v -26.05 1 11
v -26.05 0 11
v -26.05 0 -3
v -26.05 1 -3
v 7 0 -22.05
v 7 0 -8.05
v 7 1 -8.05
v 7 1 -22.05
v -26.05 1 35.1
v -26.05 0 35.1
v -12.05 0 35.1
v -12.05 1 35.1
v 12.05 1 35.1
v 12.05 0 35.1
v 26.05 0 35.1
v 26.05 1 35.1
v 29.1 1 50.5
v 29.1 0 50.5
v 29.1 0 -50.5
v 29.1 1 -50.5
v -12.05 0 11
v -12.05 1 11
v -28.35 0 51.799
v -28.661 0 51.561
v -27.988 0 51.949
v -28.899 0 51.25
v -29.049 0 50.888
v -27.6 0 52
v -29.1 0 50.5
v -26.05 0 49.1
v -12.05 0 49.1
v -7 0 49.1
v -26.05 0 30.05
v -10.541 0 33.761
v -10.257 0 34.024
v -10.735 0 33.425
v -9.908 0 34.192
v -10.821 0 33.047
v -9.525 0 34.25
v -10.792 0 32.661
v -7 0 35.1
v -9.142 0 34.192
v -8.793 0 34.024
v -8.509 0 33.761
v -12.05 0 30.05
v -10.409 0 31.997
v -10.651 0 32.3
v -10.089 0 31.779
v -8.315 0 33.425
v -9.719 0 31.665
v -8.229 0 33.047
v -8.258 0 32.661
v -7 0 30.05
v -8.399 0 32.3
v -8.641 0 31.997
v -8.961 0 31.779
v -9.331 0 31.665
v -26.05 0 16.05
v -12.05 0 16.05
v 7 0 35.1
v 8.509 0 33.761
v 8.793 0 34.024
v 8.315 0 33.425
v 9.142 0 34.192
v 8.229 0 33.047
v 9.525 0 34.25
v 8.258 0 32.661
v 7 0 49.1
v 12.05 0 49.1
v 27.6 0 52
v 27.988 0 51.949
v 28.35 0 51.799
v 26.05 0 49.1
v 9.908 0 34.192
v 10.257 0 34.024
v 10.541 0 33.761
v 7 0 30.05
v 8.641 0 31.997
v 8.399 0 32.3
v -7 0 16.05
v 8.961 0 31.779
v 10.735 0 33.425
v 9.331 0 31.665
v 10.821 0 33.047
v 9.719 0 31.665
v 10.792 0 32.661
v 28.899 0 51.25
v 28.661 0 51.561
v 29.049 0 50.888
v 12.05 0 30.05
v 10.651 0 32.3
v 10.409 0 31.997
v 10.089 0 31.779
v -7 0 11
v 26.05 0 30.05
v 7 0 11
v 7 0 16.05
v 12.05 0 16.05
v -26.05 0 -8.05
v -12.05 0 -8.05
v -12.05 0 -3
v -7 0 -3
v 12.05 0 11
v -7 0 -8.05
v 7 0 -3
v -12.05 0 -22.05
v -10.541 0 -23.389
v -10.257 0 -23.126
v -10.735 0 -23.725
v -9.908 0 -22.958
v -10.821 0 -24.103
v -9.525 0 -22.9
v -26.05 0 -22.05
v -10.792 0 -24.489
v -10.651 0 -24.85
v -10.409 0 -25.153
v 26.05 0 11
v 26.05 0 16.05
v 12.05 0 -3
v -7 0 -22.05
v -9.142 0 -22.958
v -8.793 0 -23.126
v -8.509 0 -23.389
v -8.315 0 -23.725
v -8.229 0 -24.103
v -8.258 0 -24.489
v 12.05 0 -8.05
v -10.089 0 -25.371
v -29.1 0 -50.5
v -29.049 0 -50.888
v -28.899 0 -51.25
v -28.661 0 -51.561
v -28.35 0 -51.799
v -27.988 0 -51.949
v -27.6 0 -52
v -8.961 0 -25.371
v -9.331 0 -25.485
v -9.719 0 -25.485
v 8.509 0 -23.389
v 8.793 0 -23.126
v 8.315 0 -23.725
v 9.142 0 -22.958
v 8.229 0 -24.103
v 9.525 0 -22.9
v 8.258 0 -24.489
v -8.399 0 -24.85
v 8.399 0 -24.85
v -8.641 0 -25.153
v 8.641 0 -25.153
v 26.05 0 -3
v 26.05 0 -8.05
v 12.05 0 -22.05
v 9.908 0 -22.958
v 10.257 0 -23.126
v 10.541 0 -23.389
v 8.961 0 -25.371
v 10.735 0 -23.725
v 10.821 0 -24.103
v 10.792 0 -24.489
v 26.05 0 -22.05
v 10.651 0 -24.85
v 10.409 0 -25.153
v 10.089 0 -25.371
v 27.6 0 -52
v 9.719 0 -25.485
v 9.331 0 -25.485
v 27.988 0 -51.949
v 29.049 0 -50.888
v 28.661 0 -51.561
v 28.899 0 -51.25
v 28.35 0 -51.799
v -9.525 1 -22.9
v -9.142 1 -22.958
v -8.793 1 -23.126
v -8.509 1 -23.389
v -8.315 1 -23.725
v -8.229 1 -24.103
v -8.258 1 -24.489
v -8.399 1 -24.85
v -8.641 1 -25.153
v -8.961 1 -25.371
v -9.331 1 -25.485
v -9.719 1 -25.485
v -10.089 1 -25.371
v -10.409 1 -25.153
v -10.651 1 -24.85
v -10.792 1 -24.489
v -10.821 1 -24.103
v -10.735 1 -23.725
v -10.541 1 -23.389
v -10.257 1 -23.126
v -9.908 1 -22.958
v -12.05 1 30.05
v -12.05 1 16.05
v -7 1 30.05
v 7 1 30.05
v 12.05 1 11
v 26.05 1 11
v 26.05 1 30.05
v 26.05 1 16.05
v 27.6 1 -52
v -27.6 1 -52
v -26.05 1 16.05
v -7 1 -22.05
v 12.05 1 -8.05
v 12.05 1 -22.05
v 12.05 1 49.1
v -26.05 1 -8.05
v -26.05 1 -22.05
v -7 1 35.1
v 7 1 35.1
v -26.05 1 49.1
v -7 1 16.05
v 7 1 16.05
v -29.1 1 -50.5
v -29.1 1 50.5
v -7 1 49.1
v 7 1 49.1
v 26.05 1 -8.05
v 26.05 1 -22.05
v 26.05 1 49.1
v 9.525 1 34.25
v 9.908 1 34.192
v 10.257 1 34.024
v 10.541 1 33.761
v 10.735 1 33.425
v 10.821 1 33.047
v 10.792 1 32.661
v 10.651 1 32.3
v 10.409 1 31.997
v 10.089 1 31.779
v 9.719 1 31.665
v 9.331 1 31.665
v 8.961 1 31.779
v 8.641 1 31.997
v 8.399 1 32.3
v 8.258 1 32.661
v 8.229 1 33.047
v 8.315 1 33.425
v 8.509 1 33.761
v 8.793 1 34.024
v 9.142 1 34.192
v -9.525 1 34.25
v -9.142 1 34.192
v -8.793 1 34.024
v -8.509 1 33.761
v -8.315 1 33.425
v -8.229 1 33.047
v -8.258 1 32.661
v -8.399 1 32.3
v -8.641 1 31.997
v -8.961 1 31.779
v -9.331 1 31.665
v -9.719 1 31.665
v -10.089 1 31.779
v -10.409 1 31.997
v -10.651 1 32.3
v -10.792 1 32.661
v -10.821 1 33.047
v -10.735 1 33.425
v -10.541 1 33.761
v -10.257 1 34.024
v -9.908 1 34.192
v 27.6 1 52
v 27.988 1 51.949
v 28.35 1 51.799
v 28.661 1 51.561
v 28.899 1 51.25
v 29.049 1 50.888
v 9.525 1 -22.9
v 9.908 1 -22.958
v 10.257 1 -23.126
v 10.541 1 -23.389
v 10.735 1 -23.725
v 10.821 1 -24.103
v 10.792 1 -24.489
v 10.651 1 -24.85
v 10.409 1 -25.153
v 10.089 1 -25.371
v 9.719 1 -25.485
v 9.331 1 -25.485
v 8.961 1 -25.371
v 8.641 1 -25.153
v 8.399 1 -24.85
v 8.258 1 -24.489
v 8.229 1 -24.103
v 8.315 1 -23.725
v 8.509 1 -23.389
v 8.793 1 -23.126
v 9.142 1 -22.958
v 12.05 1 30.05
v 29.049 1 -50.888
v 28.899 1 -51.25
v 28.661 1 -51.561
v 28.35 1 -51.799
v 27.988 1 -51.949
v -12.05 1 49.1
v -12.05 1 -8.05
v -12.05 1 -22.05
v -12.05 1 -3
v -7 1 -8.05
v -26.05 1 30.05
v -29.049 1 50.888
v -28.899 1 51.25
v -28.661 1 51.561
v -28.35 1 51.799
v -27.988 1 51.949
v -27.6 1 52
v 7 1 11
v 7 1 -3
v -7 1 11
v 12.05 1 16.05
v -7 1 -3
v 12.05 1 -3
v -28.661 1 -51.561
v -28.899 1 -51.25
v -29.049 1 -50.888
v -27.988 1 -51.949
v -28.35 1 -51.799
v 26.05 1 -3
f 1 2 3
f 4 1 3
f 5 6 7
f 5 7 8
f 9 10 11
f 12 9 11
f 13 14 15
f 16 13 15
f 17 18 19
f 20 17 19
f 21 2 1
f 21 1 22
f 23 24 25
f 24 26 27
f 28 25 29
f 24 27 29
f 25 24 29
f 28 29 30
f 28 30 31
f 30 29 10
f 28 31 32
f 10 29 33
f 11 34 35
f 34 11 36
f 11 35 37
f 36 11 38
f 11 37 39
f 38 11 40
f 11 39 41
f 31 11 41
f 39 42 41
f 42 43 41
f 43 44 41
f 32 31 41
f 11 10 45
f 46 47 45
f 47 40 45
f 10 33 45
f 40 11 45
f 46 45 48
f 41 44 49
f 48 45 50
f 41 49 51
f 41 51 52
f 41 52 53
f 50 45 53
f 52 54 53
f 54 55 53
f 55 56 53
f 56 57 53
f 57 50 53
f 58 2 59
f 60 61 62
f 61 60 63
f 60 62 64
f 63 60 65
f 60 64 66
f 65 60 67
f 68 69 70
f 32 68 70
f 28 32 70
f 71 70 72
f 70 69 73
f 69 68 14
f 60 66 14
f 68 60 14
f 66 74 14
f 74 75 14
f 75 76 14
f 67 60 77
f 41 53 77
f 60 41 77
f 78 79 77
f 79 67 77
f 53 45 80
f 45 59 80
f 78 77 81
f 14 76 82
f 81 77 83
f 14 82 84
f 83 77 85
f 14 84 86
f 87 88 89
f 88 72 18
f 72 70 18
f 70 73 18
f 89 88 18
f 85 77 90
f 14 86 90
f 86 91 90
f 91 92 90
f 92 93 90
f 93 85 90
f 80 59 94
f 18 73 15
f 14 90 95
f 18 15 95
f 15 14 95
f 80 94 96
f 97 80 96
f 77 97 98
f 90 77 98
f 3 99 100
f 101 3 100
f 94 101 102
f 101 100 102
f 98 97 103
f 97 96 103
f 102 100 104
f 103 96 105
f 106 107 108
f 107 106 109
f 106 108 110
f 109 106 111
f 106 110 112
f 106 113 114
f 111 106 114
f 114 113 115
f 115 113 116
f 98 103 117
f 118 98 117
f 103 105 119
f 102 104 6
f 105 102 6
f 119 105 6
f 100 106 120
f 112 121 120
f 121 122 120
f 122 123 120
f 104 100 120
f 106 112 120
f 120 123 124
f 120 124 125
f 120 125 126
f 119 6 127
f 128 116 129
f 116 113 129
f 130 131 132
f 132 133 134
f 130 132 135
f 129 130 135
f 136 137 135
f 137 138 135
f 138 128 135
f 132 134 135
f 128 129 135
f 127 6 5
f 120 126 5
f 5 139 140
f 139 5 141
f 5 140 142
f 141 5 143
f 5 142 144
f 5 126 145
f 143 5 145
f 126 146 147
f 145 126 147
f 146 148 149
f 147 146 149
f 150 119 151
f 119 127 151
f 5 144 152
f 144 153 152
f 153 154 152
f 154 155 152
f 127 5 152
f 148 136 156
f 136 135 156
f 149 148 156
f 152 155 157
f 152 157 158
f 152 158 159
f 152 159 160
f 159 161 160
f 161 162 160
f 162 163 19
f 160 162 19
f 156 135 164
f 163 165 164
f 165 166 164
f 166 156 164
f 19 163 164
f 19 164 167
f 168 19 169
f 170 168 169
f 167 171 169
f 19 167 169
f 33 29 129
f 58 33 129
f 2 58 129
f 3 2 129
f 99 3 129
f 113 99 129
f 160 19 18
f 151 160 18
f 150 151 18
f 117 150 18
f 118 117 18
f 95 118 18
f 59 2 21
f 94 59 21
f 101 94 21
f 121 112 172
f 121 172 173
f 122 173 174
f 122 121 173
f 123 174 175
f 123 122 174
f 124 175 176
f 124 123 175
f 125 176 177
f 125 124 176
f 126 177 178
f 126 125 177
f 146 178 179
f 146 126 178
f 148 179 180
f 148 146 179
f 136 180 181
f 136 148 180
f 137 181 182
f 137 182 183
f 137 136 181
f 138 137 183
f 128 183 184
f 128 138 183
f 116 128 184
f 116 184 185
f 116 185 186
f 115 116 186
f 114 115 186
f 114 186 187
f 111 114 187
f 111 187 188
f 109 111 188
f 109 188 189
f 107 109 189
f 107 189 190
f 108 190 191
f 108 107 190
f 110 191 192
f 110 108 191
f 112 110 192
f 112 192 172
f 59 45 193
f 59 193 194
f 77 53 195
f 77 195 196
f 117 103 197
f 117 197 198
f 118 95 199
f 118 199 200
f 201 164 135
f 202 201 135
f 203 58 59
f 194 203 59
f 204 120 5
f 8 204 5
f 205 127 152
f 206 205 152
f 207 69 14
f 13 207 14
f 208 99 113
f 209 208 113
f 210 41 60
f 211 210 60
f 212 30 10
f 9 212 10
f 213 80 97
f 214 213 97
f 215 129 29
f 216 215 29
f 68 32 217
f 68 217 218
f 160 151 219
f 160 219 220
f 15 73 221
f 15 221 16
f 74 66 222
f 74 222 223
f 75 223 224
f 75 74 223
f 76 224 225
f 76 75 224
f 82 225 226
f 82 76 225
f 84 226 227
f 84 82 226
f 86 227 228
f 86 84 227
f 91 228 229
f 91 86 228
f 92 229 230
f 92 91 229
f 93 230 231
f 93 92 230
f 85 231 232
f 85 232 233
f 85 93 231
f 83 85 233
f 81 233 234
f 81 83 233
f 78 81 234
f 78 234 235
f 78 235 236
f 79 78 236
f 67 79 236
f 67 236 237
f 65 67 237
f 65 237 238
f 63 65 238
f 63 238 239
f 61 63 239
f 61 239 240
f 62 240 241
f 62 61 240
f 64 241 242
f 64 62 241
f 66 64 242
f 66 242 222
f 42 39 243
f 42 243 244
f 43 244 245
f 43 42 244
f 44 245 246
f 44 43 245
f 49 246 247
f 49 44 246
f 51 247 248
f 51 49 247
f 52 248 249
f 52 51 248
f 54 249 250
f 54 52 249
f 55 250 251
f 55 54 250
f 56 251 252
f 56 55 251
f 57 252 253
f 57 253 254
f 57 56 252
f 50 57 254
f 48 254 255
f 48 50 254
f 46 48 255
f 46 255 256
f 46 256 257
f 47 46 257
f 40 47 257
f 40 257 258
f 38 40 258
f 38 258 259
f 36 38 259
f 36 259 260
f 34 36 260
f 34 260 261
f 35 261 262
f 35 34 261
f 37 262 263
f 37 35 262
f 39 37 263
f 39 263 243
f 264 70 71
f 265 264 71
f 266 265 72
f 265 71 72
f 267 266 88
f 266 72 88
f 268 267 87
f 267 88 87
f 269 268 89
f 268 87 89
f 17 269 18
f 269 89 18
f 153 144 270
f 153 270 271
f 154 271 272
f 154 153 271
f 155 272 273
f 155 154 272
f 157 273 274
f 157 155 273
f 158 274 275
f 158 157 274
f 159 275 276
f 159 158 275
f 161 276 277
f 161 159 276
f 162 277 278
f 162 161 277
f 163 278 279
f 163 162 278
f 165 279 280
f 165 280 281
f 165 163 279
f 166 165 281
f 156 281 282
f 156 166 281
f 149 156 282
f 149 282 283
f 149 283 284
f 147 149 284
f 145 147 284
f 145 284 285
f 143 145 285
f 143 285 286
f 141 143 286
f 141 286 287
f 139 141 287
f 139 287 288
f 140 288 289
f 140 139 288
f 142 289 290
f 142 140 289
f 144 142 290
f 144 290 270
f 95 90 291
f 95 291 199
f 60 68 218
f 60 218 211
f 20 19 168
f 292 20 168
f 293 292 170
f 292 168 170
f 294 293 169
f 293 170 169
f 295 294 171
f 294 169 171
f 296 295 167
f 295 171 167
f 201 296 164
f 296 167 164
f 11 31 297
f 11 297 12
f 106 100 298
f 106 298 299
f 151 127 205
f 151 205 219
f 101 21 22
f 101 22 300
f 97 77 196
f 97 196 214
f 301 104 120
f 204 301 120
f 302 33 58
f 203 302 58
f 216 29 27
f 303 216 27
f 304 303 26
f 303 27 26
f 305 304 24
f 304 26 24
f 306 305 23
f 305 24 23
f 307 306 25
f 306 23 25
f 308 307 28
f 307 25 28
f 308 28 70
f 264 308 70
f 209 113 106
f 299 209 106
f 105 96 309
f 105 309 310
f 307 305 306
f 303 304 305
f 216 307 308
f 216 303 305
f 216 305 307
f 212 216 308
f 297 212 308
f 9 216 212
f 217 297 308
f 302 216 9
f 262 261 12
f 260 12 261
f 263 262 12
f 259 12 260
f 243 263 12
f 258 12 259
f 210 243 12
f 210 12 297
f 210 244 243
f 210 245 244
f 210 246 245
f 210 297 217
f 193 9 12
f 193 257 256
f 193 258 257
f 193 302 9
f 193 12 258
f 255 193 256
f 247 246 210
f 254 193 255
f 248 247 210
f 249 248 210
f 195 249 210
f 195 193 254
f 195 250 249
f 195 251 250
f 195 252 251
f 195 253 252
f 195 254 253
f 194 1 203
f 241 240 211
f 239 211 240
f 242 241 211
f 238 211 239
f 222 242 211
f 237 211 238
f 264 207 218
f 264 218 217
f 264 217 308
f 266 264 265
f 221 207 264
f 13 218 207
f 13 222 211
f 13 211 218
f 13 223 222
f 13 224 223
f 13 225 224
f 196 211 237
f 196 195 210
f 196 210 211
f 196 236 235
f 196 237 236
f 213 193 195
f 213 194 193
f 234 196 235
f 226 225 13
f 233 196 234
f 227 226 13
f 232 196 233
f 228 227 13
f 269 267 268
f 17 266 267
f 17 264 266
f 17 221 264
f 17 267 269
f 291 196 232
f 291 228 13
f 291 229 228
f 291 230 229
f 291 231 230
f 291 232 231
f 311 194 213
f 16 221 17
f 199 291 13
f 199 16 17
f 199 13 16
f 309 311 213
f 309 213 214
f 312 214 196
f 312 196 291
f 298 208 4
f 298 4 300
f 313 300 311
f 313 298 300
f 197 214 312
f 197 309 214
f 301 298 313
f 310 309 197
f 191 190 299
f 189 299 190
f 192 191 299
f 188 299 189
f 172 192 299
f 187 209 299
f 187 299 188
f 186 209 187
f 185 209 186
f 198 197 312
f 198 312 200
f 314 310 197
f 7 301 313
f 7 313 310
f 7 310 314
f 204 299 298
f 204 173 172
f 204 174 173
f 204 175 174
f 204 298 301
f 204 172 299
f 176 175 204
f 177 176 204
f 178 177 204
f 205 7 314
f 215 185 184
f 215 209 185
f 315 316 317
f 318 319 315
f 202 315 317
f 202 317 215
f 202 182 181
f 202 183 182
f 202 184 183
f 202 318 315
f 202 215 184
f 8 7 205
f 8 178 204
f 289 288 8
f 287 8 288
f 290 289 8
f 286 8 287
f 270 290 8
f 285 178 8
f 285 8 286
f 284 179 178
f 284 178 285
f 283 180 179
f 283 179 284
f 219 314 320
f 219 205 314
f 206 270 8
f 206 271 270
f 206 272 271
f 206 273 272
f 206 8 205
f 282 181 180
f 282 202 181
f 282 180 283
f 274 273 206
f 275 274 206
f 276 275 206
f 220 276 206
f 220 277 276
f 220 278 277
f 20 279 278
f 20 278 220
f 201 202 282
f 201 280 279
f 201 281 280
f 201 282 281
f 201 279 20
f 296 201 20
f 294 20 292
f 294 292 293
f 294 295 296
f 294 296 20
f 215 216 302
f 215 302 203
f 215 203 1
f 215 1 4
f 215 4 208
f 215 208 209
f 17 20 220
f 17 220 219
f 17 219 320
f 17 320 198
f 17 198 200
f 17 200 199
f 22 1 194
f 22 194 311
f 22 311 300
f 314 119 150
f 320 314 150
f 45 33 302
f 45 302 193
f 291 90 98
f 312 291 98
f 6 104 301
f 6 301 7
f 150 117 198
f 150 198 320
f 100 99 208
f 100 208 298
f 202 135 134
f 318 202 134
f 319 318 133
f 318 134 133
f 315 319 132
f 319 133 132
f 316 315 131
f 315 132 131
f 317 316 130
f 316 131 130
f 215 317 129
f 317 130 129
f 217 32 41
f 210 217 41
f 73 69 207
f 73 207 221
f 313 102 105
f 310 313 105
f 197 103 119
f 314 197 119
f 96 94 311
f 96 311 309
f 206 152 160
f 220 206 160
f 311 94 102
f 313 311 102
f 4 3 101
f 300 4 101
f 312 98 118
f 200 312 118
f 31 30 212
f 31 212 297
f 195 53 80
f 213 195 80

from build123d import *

# Parameters (mm, degrees)
SKETCH1_R           = 1.3
SKETCH1_W           = 14
SKETCH1_H           = 14
BOSS_EXTRUDE1_DEPTH = 1


with BuildPart() as part:
    # Sketch1 → Boss-Extrude1 (new body)
    with BuildSketch(Plane(origin=(0, 0, 0), x_dir=(1, 0, 0), z_dir=(0, 1, 0))):
        with BuildLine():
            Line((27.6, 52), (-27.6, 52))
            ThreePointArc((-27.6, 52), (-28.660660172, 51.560660172), (-29.1, 50.5))
            Line((-29.1, 50.5), (-29.1, -50.5))
            ThreePointArc((-29.1, -50.5), (-28.660660172, -51.560660172), (-27.6, -52))
            Line((-27.6, -52), (27.6, -52))
            ThreePointArc((27.6, -52), (28.660660172, -51.560660172), (29.1, -50.5))
            Line((29.1, -50.5), (29.1, 50.5))
            ThreePointArc((29.1, 50.5), (28.660660172, 51.560660172), (27.6, 52))
        make_face()
        with Locations(Location((-9.525, -32.95, 0), (0, 0, 270))):
            Circle(SKETCH1_R, mode=Mode.SUBTRACT)
        with Locations(Location((9.525, -32.95, 0), (0, 0, 270))):
            Circle(SKETCH1_R, mode=Mode.SUBTRACT)
        with Locations(Location((9.525, 24.2, 0), (0, 0, 270))):
            Circle(SKETCH1_R, mode=Mode.SUBTRACT)
        with Locations(Location((-9.525, 24.2, 0), (0, 0, 270))):
            Circle(SKETCH1_R, mode=Mode.SUBTRACT)
        with Locations((0, -42.1)):
            Rectangle(SKETCH1_W, SKETCH1_H, mode=Mode.SUBTRACT)
        with Locations((19.05, -42.1)):
            Rectangle(SKETCH1_W, SKETCH1_H, mode=Mode.SUBTRACT)
        with Locations((-19.05, -42.1)):
            Rectangle(SKETCH1_W, SKETCH1_H, mode=Mode.SUBTRACT)
        with Locations((-19.05, -23.05)):
            Rectangle(SKETCH1_W, SKETCH1_H, mode=Mode.SUBTRACT)
        with Locations((0, -23.05)):
            Rectangle(SKETCH1_W, SKETCH1_H, mode=Mode.SUBTRACT)
        with Locations((19.05, -23.05)):
            Rectangle(SKETCH1_W, SKETCH1_H, mode=Mode.SUBTRACT)
        with Locations((-19.05, -4)):
            Rectangle(SKETCH1_W, SKETCH1_H, mode=Mode.SUBTRACT)
        with Locations((0, -4)):
            Rectangle(SKETCH1_W, SKETCH1_H, mode=Mode.SUBTRACT)
        with Locations((19.05, -4)):
            Rectangle(SKETCH1_W, SKETCH1_H, mode=Mode.SUBTRACT)
        with Locations((-19.05, 15.05)):
            Rectangle(SKETCH1_W, SKETCH1_H, mode=Mode.SUBTRACT)
        with Locations((0, 15.05)):
            Rectangle(SKETCH1_W, SKETCH1_H, mode=Mode.SUBTRACT)
        with Locations((19.05, 15.05)):
            Rectangle(SKETCH1_W, SKETCH1_H, mode=Mode.SUBTRACT)
    extrude(amount=BOSS_EXTRUDE1_DEPTH)


solid = part.part
